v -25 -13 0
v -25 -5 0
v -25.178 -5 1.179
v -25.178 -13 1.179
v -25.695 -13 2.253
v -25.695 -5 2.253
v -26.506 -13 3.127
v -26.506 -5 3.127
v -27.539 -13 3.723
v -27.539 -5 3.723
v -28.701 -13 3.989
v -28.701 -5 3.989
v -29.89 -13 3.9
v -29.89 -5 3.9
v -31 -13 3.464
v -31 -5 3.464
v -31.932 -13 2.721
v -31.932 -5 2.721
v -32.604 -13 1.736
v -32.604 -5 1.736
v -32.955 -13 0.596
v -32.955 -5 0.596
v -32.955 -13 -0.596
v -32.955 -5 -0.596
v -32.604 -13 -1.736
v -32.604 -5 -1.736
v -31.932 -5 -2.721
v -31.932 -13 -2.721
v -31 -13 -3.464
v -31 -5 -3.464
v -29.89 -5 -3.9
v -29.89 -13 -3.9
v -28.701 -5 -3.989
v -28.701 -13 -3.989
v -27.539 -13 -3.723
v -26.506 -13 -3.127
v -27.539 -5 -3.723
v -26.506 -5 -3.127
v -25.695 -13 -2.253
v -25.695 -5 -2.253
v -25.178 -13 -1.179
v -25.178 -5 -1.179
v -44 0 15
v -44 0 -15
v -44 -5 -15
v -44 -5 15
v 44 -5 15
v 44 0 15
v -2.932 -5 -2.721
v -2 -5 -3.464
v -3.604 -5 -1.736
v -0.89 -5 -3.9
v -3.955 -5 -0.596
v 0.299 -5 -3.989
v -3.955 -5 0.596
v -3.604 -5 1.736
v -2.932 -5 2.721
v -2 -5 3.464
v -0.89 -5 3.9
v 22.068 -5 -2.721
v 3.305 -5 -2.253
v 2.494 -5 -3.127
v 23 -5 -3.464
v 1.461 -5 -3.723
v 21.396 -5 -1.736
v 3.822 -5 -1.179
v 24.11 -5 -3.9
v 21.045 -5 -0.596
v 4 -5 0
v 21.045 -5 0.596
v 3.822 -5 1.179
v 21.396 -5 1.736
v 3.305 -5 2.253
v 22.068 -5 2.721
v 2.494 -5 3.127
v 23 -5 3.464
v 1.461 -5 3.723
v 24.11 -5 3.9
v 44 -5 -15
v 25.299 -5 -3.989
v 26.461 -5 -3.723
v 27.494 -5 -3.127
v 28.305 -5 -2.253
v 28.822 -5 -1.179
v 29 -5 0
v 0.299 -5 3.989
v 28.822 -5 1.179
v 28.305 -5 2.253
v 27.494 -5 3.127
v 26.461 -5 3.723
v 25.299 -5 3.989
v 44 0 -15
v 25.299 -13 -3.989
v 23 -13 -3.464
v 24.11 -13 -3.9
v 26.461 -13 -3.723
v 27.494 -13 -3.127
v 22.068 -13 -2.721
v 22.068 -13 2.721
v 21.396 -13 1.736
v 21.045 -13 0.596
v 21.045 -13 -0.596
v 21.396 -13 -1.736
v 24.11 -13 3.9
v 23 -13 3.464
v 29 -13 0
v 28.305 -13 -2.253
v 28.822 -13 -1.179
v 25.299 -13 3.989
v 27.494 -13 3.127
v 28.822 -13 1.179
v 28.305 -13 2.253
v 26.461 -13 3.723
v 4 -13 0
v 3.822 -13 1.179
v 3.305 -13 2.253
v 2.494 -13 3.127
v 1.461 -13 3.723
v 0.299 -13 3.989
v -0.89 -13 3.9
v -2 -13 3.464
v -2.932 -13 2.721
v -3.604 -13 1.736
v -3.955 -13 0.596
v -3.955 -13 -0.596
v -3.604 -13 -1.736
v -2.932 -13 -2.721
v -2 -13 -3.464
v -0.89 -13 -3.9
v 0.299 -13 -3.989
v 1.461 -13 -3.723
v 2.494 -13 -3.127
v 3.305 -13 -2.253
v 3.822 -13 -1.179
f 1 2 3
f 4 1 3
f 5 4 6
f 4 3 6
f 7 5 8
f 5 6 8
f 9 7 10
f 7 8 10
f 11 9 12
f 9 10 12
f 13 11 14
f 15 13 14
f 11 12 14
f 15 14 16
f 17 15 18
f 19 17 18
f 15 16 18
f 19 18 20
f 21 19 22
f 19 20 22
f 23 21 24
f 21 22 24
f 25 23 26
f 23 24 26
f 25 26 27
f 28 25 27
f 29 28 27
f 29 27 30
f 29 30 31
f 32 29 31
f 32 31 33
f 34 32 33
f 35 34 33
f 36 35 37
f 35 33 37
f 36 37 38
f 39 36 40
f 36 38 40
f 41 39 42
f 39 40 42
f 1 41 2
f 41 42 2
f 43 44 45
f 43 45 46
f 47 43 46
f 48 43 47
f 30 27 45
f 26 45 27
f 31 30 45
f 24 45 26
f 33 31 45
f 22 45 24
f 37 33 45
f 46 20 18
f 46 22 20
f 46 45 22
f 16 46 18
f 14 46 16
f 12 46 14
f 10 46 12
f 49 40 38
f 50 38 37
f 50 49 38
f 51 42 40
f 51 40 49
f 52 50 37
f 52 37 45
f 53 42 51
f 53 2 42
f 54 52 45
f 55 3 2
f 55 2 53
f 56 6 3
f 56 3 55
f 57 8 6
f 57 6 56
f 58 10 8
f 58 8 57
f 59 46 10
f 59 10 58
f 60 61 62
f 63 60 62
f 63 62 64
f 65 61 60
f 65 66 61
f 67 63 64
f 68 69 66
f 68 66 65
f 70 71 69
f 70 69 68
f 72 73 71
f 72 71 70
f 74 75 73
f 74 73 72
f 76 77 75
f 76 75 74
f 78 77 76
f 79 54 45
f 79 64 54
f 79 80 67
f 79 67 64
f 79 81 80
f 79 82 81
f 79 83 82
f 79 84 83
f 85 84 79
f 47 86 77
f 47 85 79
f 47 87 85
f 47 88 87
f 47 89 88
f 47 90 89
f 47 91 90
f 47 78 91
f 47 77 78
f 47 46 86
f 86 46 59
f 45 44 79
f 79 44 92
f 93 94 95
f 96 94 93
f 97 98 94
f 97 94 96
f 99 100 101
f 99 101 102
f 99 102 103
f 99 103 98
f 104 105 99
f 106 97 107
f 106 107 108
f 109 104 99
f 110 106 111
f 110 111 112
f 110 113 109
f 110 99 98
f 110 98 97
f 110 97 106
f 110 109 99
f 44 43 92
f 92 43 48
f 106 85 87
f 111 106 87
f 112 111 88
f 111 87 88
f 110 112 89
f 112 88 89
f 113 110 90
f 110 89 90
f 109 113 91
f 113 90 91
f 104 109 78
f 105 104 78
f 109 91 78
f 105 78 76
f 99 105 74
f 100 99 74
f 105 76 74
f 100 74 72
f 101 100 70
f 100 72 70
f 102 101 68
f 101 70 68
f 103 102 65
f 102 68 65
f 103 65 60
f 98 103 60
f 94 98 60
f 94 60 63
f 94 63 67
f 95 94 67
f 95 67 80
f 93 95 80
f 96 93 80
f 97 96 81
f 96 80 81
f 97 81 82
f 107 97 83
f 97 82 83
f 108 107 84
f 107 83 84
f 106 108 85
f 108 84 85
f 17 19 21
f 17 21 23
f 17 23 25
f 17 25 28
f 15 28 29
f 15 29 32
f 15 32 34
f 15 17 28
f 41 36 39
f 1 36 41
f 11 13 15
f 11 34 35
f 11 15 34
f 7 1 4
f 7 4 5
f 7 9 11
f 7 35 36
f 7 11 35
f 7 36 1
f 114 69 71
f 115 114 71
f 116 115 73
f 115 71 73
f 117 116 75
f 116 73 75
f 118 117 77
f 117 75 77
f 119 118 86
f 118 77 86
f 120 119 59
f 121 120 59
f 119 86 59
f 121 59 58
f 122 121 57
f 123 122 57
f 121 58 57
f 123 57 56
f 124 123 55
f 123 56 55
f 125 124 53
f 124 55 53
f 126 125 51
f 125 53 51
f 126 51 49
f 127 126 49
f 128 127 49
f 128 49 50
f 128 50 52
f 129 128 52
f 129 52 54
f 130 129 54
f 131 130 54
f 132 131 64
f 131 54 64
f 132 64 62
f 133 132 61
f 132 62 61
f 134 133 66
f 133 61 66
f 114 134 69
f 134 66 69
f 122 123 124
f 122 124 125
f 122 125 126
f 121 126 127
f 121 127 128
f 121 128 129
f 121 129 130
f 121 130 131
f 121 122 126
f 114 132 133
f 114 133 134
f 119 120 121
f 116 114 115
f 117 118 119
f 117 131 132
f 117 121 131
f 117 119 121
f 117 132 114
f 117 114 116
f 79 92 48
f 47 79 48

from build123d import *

# Parameters (mm, degrees)
F0_W     = 88
F0_H     = 30
F1_DEPTH = 5
F2_R     = 4
F3_DEPTH = 8
F4_R     = 4
F5_DEPTH = 8


with BuildPart() as f1:
    # F0 (on Front) → F1 (new body)
    with BuildSketch(Plane.XZ):
        Rectangle(F0_W, F0_H)
    extrude(amount=F1_DEPTH)

    # F2 (on face) → F3 (join)
    with BuildSketch(Plane.XZ.offset(5)):
        with Locations((-29, 0)):
            Circle(F2_R)
    extrude(amount=F3_DEPTH)

    # F4 (on face) → F5 (join)
    with BuildSketch(Plane.XZ.offset(5)):
        Circle(F4_R)
        with Locations((25, 0)):
            Circle(F4_R)
    extrude(amount=F5_DEPTH)


solid = f1.part
